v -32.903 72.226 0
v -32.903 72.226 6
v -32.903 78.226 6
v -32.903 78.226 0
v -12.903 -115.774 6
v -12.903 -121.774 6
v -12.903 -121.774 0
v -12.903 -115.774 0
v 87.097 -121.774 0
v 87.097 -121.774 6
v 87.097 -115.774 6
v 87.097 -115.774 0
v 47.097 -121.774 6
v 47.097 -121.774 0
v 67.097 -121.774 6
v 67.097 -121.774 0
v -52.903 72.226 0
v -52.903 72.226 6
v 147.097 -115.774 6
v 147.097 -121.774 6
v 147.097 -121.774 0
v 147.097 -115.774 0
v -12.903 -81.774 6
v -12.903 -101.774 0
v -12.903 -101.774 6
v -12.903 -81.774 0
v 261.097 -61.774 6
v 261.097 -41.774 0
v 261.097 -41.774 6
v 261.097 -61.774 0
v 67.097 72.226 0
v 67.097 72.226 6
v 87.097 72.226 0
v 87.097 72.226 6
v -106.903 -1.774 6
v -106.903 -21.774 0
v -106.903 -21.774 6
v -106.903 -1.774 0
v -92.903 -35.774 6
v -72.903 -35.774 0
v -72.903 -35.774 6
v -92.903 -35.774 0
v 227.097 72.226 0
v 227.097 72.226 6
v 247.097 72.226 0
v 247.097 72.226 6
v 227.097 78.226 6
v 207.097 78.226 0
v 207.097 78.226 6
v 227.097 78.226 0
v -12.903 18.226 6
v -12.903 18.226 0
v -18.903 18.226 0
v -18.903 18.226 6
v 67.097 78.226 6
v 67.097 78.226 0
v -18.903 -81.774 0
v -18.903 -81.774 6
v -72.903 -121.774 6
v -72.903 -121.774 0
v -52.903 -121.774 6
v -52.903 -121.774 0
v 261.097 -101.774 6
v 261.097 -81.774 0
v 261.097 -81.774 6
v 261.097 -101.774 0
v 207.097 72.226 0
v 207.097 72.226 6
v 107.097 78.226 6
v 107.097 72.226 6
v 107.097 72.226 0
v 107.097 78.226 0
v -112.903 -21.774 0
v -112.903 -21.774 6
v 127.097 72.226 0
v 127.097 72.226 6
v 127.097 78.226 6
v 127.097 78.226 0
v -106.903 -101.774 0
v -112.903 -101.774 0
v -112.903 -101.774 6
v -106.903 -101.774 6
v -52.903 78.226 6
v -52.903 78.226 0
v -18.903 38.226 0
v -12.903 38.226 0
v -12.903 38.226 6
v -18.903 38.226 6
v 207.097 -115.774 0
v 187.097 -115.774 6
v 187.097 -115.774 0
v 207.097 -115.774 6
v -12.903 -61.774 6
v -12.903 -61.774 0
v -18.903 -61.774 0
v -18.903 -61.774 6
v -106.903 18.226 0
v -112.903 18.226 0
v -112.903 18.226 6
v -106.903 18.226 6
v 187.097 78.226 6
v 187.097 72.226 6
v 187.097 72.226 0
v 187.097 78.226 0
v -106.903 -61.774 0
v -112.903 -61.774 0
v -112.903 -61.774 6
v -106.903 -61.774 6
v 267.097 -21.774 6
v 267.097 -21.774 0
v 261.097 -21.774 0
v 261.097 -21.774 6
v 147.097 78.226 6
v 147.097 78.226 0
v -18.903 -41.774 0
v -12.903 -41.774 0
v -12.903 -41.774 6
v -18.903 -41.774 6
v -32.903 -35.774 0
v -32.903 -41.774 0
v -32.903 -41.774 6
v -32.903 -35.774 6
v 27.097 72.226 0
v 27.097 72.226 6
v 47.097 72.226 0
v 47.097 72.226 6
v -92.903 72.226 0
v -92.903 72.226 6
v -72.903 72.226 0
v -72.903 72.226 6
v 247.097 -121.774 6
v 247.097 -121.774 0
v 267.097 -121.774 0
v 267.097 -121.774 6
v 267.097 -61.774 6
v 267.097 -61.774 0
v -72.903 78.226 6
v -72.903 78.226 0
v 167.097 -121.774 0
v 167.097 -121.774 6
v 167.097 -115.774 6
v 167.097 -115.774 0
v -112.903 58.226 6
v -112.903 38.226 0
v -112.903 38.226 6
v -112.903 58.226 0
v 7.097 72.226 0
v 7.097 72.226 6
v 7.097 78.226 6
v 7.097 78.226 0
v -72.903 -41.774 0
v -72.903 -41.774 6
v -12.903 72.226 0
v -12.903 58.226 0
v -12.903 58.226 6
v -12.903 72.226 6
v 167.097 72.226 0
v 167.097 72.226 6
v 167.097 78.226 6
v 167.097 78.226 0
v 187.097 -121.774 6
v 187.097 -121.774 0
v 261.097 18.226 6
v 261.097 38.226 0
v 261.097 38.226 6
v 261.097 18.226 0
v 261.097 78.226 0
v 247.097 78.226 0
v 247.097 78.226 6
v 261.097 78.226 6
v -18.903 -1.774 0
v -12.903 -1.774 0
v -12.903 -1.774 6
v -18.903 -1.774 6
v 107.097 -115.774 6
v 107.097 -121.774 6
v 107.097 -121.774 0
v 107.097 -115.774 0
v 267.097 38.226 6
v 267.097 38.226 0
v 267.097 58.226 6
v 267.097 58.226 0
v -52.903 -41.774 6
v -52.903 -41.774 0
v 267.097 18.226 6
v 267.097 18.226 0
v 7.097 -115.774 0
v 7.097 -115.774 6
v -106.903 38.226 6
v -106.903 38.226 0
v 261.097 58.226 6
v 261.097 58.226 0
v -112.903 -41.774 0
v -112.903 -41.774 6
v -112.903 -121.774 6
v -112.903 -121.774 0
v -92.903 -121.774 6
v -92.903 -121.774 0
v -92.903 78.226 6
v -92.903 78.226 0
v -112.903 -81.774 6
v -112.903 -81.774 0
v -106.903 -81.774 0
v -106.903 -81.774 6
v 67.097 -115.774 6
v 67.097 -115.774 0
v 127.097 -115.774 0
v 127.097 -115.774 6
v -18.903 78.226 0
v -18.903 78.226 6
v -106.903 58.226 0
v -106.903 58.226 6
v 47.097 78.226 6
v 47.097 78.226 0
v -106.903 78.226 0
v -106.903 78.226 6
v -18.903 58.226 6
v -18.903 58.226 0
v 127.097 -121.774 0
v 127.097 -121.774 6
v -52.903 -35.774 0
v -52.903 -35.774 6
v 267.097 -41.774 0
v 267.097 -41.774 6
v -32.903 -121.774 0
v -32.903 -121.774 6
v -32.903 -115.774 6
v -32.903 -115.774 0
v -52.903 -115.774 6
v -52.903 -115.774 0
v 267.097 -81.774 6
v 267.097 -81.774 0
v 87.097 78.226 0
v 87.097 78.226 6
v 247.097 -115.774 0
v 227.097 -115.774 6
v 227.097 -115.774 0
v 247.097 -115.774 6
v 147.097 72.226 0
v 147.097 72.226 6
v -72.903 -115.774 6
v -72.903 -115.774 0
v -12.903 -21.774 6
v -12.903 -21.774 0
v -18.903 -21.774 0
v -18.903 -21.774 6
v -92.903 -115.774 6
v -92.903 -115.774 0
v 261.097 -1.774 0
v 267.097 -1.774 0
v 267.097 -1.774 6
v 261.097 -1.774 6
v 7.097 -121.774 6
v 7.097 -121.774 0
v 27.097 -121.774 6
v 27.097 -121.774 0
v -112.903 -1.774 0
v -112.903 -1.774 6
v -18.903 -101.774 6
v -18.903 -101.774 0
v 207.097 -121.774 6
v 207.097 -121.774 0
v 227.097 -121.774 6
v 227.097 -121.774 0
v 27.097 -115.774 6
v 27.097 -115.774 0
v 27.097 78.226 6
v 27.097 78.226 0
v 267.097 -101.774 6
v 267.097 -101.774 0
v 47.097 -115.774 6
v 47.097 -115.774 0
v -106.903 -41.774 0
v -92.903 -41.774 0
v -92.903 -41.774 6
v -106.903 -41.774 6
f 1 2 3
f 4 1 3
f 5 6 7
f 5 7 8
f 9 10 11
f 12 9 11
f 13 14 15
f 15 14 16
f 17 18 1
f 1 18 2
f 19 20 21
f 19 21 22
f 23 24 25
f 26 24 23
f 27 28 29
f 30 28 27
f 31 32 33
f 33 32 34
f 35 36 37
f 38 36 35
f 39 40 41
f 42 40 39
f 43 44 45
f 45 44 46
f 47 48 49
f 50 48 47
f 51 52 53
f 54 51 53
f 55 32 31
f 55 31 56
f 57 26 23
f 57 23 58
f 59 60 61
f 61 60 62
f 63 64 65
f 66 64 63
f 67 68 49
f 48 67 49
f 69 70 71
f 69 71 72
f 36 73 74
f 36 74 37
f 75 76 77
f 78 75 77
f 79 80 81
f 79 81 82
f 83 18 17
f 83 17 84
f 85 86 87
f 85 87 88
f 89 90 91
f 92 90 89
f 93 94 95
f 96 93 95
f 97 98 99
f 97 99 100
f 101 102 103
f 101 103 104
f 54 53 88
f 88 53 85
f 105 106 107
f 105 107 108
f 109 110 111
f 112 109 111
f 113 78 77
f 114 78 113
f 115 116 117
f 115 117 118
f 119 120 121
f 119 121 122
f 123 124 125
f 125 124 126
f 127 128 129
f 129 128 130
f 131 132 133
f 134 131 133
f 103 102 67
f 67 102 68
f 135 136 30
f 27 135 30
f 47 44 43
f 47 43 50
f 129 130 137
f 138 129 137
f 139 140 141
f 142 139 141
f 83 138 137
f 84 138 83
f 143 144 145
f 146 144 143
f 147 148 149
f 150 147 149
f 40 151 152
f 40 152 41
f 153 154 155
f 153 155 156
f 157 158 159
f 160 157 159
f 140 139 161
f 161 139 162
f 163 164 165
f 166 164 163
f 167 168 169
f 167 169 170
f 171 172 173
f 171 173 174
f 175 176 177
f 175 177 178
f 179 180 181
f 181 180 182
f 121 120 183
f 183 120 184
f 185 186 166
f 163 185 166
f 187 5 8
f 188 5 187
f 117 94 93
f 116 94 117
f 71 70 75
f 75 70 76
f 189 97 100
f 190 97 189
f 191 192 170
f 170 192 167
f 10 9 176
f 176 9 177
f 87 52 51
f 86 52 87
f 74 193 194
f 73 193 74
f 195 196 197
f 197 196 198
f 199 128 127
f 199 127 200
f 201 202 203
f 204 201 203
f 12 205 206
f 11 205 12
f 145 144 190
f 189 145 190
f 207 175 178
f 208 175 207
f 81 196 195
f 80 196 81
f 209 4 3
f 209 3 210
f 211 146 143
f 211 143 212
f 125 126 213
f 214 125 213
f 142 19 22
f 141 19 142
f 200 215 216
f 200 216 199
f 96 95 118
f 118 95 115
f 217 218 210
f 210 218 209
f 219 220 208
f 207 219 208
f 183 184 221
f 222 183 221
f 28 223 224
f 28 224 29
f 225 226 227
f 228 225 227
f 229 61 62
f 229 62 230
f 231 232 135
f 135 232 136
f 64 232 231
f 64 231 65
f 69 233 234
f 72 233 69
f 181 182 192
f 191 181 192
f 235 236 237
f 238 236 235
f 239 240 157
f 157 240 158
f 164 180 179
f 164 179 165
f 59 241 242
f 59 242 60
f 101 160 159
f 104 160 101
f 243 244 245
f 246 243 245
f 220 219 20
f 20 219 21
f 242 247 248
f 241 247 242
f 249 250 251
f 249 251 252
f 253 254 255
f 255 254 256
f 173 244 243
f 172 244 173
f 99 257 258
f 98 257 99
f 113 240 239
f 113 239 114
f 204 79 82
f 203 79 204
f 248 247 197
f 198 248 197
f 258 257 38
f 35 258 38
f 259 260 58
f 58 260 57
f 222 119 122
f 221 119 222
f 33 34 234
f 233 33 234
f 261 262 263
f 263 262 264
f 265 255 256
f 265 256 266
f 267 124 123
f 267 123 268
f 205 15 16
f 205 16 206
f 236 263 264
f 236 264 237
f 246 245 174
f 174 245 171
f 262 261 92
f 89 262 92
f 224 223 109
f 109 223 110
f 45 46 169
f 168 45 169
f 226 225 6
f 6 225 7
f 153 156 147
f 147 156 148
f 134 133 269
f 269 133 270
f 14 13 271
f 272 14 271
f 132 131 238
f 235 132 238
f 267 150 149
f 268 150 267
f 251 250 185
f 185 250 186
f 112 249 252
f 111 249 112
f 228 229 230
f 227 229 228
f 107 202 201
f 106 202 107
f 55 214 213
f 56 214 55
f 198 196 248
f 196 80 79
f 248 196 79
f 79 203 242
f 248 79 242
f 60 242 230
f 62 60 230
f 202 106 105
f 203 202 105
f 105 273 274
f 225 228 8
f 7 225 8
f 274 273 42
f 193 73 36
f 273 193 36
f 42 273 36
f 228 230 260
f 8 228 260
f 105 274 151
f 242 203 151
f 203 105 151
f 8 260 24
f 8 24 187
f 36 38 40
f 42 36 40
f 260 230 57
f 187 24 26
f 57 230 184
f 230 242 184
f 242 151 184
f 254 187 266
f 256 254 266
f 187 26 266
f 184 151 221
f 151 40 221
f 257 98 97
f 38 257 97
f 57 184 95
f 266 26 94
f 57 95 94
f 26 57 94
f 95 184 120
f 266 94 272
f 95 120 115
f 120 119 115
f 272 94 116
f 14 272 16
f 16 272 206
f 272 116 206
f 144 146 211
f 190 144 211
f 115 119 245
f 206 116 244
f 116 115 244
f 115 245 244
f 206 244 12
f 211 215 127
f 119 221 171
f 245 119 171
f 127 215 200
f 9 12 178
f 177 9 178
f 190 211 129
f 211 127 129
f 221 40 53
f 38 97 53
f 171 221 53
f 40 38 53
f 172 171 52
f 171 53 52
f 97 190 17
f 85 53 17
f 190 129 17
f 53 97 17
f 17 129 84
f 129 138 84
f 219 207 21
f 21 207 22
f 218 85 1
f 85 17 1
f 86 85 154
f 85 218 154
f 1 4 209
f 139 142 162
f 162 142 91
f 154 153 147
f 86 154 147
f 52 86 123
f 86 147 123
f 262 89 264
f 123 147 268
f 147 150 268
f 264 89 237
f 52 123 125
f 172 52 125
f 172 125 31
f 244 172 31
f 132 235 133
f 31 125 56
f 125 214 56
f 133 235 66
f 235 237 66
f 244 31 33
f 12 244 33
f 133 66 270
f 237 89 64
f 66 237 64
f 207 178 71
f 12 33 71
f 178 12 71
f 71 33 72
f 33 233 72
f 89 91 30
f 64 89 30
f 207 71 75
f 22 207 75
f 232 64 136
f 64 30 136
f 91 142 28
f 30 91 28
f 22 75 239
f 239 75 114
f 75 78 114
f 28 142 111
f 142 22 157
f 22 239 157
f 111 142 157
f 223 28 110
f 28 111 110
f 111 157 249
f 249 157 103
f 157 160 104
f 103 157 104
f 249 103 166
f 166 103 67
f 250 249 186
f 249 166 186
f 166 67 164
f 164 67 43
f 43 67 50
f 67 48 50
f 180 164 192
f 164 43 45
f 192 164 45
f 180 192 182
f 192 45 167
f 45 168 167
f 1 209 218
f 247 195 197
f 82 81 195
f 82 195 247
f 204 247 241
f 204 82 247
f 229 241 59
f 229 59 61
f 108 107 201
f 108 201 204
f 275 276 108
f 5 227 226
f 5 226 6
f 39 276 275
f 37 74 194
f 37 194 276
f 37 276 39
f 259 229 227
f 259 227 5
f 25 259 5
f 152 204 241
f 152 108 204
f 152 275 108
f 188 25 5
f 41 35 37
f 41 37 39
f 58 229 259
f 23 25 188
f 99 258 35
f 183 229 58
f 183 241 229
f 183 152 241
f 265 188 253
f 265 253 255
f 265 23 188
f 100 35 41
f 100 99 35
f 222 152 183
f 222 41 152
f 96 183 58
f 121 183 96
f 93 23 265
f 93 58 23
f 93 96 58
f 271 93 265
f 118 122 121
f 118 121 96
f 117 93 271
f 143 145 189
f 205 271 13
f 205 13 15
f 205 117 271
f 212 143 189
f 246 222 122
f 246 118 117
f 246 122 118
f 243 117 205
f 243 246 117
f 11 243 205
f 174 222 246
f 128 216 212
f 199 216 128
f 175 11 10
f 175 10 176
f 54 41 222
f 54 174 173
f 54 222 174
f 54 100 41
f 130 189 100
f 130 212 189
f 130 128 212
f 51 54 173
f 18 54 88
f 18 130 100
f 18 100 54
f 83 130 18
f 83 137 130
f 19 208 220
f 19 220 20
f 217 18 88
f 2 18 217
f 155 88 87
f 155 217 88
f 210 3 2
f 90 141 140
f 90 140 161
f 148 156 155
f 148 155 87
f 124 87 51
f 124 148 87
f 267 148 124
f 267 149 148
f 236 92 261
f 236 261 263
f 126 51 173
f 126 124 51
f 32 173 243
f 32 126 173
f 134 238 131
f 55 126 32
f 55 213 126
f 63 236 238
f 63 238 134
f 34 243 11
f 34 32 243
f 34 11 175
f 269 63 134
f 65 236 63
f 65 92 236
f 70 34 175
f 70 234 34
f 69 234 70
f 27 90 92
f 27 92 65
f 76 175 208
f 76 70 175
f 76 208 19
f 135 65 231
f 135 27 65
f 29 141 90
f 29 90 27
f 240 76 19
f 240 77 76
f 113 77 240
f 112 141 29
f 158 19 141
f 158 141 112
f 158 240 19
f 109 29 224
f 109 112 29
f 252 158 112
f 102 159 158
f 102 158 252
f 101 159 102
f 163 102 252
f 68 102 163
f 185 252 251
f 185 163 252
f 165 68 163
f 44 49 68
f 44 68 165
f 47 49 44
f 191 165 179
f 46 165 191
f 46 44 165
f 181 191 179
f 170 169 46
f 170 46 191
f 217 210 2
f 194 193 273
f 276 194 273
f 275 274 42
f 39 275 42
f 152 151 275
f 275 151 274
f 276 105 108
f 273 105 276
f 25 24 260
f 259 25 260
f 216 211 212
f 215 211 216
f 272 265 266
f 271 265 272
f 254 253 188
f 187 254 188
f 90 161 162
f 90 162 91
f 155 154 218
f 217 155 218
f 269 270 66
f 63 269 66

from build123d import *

# Parameters (mm, degrees)
SKETCH1_W               = 380
SKETCH1_H               = 200
BOSS_EXTRUDE1_DEPTH     = 6
SKETCH6_W               = 6
SKETCH6_H               = 20
CUT_EXTRUDE4_DEPTH      = 7
LPATTERN3_COUNT         = 5
LPATTERN3_PITCH         = 40
SKETCH7_W               = 20
SKETCH7_H               = 6
CUT_EXTRUDE5_DEPTH      = 10
LPATTERN4_COUNT         = 9
LPATTERN4_PITCH         = 40
MIRROR1_COPY_1_SKETCH_W = 20
MIRROR1_COPY_1_SKETCH_H = 6
MIRROR1_COPY_1_DEPTH    = 10
MIRROR1_COPY_2_SKETCH_W = 20
MIRROR1_COPY_2_SKETCH_H = 6
MIRROR1_COPY_2_DEPTH    = 10
MIRROR1_COPY_3_SKETCH_W = 20
MIRROR1_COPY_3_SKETCH_H = 6
MIRROR1_COPY_3_DEPTH    = 10
MIRROR1_COPY_4_SKETCH_W = 20
MIRROR1_COPY_4_SKETCH_H = 6
MIRROR1_COPY_4_DEPTH    = 10
MIRROR1_COPY_5_SKETCH_W = 20
MIRROR1_COPY_5_SKETCH_H = 6
MIRROR1_COPY_5_DEPTH    = 10
MIRROR1_COPY_6_SKETCH_W = 20
MIRROR1_COPY_6_SKETCH_H = 6
MIRROR1_COPY_6_DEPTH    = 10
MIRROR1_COPY_7_SKETCH_W = 20
MIRROR1_COPY_7_SKETCH_H = 6
MIRROR1_COPY_7_DEPTH    = 10
MIRROR1_COPY_8_SKETCH_W = 20
MIRROR1_COPY_8_SKETCH_H = 6
MIRROR1_COPY_8_DEPTH    = 10
MIRROR2_COPY_1_SKETCH_W = 6
MIRROR2_COPY_1_SKETCH_H = 20
MIRROR2_COPY_1_DEPTH    = 7
MIRROR2_COPY_2_SKETCH_W = 6
MIRROR2_COPY_2_SKETCH_H = 20
MIRROR2_COPY_2_DEPTH    = 7
MIRROR2_COPY_3_SKETCH_W = 6
MIRROR2_COPY_3_SKETCH_H = 20
MIRROR2_COPY_3_DEPTH    = 7
MIRROR2_COPY_4_SKETCH_W = 6
MIRROR2_COPY_4_SKETCH_H = 20
MIRROR2_COPY_4_DEPTH    = 7
SKETCH10_W              = 6
SKETCH10_H              = 20
CUT_EXTRUDE6_DEPTH      = 10
LPATTERN5_COUNT         = 5
LPATTERN5_PITCH         = 40
SKETCH11_W              = 20
SKETCH11_H              = 6
CUT_EXTRUDE7_DEPTH      = 10
LPATTERN6_COUNT         = 2
LPATTERN6_PITCH         = 40


with BuildPart() as part:
    # Sketch1 → Boss-Extrude1 (new body)
    with BuildSketch(Plane.XY):
        with Locations((77.096774194, -21.774193548)):
            Rectangle(SKETCH1_W, SKETCH1_H)
    extrude(amount=BOSS_EXTRUDE1_DEPTH)

    # Sketch6 → Cut-Extrude4 (cut, through all)
    with BuildSketch(Plane.XY):
        with Locations((-109.903225806, 68.225806452)):
            Rectangle(SKETCH6_W, SKETCH6_H)
    cut_extrude4 = extrude(amount=CUT_EXTRUDE4_DEPTH, mode=Mode.SUBTRACT)

    # LPattern3: Cut-Extrude4 ×5
    with Locations(*[(0, -i * LPATTERN3_PITCH, 0) for i in range(1, LPATTERN3_COUNT)]):
        add(cut_extrude4, mode=Mode.SUBTRACT)

    # Sketch7 → Cut-Extrude5 (cut)
    with BuildSketch(Plane.XY.offset(6)):
        with Locations((-82.903225806, 75.225806452)):
            Rectangle(SKETCH7_W, SKETCH7_H)
    cut_extrude5 = extrude(amount=-CUT_EXTRUDE5_DEPTH, mode=Mode.SUBTRACT)

    # LPattern4: Cut-Extrude5 ×9
    with Locations(*[(i * LPATTERN4_PITCH, 0, 0) for i in range(1, LPATTERN4_COUNT)]):
        add(cut_extrude5, mode=Mode.SUBTRACT)

    # Mirror1: Cut-Extrude5 across plane
    add(cut_extrude5.mirror(Plane.ZX.offset(-21.774193548)), mode=Mode.SUBTRACT)

    # Mirror1 copy 1 sketch → Mirror1 copy 1 (cut)
    with BuildSketch(Plane(origin=(40, -43.548387097, 6), x_dir=(1, 0, 0), z_dir=(0, 0, 1))):
        with Locations((-82.903225806, -75.225806452)):
            Rectangle(MIRROR1_COPY_1_SKETCH_W, MIRROR1_COPY_1_SKETCH_H)
    extrude(amount=-MIRROR1_COPY_1_DEPTH, mode=Mode.SUBTRACT)

    # Mirror1 copy 2 sketch → Mirror1 copy 2 (cut)
    with BuildSketch(Plane(origin=(80, -43.548387097, 6), x_dir=(1, 0, 0), z_dir=(0, 0, 1))):
        with Locations((-82.903225806, -75.225806452)):
            Rectangle(MIRROR1_COPY_2_SKETCH_W, MIRROR1_COPY_2_SKETCH_H)
    extrude(amount=-MIRROR1_COPY_2_DEPTH, mode=Mode.SUBTRACT)

    # Mirror1 copy 3 sketch → Mirror1 copy 3 (cut)
    with BuildSketch(Plane(origin=(120, -43.548387097, 6), x_dir=(1, 0, 0), z_dir=(0, 0, 1))):
        with Locations((-82.903225806, -75.225806452)):
            Rectangle(MIRROR1_COPY_3_SKETCH_W, MIRROR1_COPY_3_SKETCH_H)
    extrude(amount=-MIRROR1_COPY_3_DEPTH, mode=Mode.SUBTRACT)

    # Mirror1 copy 4 sketch → Mirror1 copy 4 (cut)
    with BuildSketch(Plane(origin=(160, -43.548387097, 6), x_dir=(1, 0, 0), z_dir=(0, 0, 1))):
        with Locations((-82.903225806, -75.225806452)):
            Rectangle(MIRROR1_COPY_4_SKETCH_W, MIRROR1_COPY_4_SKETCH_H)
    extrude(amount=-MIRROR1_COPY_4_DEPTH, mode=Mode.SUBTRACT)

    # Mirror1 copy 5 sketch → Mirror1 copy 5 (cut)
    with BuildSketch(Plane(origin=(200, -43.548387097, 6), x_dir=(1, 0, 0), z_dir=(0, 0, 1))):
        with Locations((-82.903225806, -75.225806452)):
            Rectangle(MIRROR1_COPY_5_SKETCH_W, MIRROR1_COPY_5_SKETCH_H)
    extrude(amount=-MIRROR1_COPY_5_DEPTH, mode=Mode.SUBTRACT)

    # Mirror1 copy 6 sketch → Mirror1 copy 6 (cut)
    with BuildSketch(Plane(origin=(240, -43.548387097, 6), x_dir=(1, 0, 0), z_dir=(0, 0, 1))):
        with Locations((-82.903225806, -75.225806452)):
            Rectangle(MIRROR1_COPY_6_SKETCH_W, MIRROR1_COPY_6_SKETCH_H)
    extrude(amount=-MIRROR1_COPY_6_DEPTH, mode=Mode.SUBTRACT)

    # Mirror1 copy 7 sketch → Mirror1 copy 7 (cut)
    with BuildSketch(Plane(origin=(280, -43.548387097, 6), x_dir=(1, 0, 0), z_dir=(0, 0, 1))):
        with Locations((-82.903225806, -75.225806452)):
            Rectangle(MIRROR1_COPY_7_SKETCH_W, MIRROR1_COPY_7_SKETCH_H)
    extrude(amount=-MIRROR1_COPY_7_DEPTH, mode=Mode.SUBTRACT)

    # Mirror1 copy 8 sketch → Mirror1 copy 8 (cut)
    with BuildSketch(Plane(origin=(320, -43.548387097, 6), x_dir=(1, 0, 0), z_dir=(0, 0, 1))):
        with Locations((-82.903225806, -75.225806452)):
            Rectangle(MIRROR1_COPY_8_SKETCH_W, MIRROR1_COPY_8_SKETCH_H)
    extrude(amount=-MIRROR1_COPY_8_DEPTH, mode=Mode.SUBTRACT)

    # Mirror2: Cut-Extrude4 across plane
    add(cut_extrude4.mirror(Plane(origin=(77.096774194, 0, 0), x_dir=(0, 0, 1), z_dir=(1, 0, 0))), mode=Mode.SUBTRACT)

    # Mirror2 copy 1 sketch → Mirror2 copy 1 (cut, through all)
    with BuildSketch(Plane(origin=(154.193548387, -40, 0), x_dir=(-1, 0, 0), z_dir=(0, 0, 1))):
        with Locations((-109.903225806, -68.225806452)):
            Rectangle(MIRROR2_COPY_1_SKETCH_W, MIRROR2_COPY_1_SKETCH_H)
    extrude(amount=MIRROR2_COPY_1_DEPTH, mode=Mode.SUBTRACT)

    # Mirror2 copy 2 sketch → Mirror2 copy 2 (cut, through all)
    with BuildSketch(Plane(origin=(154.193548387, -80, 0), x_dir=(-1, 0, 0), z_dir=(0, 0, 1))):
        with Locations((-109.903225806, -68.225806452)):
            Rectangle(MIRROR2_COPY_2_SKETCH_W, MIRROR2_COPY_2_SKETCH_H)
    extrude(amount=MIRROR2_COPY_2_DEPTH, mode=Mode.SUBTRACT)

    # Mirror2 copy 3 sketch → Mirror2 copy 3 (cut, through all)
    with BuildSketch(Plane(origin=(154.193548387, -120, 0), x_dir=(-1, 0, 0), z_dir=(0, 0, 1))):
        with Locations((-109.903225806, -68.225806452)):
            Rectangle(MIRROR2_COPY_3_SKETCH_W, MIRROR2_COPY_3_SKETCH_H)
    extrude(amount=MIRROR2_COPY_3_DEPTH, mode=Mode.SUBTRACT)

    # Mirror2 copy 4 sketch → Mirror2 copy 4 (cut, through all)
    with BuildSketch(Plane(origin=(154.193548387, -160, 0), x_dir=(-1, 0, 0), z_dir=(0, 0, 1))):
        with Locations((-109.903225806, -68.225806452)):
            Rectangle(MIRROR2_COPY_4_SKETCH_W, MIRROR2_COPY_4_SKETCH_H)
    extrude(amount=MIRROR2_COPY_4_DEPTH, mode=Mode.SUBTRACT)

    # Sketch10 → Cut-Extrude6 (cut)
    with BuildSketch(Plane(origin=(0, 0, 0), x_dir=(-1, 0, 0), z_dir=(0, 0, -1))):
        with Locations((15.903225806, 68.225806452)):
            Rectangle(SKETCH10_W, SKETCH10_H)
    cut_extrude6 = extrude(amount=-CUT_EXTRUDE6_DEPTH, mode=Mode.SUBTRACT)

    # LPattern5: Cut-Extrude6 ×5
    with Locations(*[(0, -i * LPATTERN5_PITCH, 0) for i in range(1, LPATTERN5_COUNT)]):
        add(cut_extrude6, mode=Mode.SUBTRACT)

    # Sketch11 → Cut-Extrude7 (cut)
    with BuildSketch(Plane(origin=(0, 0, 0), x_dir=(-1, 0, 0), z_dir=(0, 0, -1))):
        with Locations((42.903225806, -38.774193548)):
            Rectangle(SKETCH11_W, SKETCH11_H)
    cut_extrude7 = extrude(amount=-CUT_EXTRUDE7_DEPTH, mode=Mode.SUBTRACT)

    # LPattern6: Cut-Extrude7 ×2
    with Locations(*[(-i * LPATTERN6_PITCH, 0, 0) for i in range(1, LPATTERN6_COUNT)]):
        add(cut_extrude7, mode=Mode.SUBTRACT)


solid = part.part
